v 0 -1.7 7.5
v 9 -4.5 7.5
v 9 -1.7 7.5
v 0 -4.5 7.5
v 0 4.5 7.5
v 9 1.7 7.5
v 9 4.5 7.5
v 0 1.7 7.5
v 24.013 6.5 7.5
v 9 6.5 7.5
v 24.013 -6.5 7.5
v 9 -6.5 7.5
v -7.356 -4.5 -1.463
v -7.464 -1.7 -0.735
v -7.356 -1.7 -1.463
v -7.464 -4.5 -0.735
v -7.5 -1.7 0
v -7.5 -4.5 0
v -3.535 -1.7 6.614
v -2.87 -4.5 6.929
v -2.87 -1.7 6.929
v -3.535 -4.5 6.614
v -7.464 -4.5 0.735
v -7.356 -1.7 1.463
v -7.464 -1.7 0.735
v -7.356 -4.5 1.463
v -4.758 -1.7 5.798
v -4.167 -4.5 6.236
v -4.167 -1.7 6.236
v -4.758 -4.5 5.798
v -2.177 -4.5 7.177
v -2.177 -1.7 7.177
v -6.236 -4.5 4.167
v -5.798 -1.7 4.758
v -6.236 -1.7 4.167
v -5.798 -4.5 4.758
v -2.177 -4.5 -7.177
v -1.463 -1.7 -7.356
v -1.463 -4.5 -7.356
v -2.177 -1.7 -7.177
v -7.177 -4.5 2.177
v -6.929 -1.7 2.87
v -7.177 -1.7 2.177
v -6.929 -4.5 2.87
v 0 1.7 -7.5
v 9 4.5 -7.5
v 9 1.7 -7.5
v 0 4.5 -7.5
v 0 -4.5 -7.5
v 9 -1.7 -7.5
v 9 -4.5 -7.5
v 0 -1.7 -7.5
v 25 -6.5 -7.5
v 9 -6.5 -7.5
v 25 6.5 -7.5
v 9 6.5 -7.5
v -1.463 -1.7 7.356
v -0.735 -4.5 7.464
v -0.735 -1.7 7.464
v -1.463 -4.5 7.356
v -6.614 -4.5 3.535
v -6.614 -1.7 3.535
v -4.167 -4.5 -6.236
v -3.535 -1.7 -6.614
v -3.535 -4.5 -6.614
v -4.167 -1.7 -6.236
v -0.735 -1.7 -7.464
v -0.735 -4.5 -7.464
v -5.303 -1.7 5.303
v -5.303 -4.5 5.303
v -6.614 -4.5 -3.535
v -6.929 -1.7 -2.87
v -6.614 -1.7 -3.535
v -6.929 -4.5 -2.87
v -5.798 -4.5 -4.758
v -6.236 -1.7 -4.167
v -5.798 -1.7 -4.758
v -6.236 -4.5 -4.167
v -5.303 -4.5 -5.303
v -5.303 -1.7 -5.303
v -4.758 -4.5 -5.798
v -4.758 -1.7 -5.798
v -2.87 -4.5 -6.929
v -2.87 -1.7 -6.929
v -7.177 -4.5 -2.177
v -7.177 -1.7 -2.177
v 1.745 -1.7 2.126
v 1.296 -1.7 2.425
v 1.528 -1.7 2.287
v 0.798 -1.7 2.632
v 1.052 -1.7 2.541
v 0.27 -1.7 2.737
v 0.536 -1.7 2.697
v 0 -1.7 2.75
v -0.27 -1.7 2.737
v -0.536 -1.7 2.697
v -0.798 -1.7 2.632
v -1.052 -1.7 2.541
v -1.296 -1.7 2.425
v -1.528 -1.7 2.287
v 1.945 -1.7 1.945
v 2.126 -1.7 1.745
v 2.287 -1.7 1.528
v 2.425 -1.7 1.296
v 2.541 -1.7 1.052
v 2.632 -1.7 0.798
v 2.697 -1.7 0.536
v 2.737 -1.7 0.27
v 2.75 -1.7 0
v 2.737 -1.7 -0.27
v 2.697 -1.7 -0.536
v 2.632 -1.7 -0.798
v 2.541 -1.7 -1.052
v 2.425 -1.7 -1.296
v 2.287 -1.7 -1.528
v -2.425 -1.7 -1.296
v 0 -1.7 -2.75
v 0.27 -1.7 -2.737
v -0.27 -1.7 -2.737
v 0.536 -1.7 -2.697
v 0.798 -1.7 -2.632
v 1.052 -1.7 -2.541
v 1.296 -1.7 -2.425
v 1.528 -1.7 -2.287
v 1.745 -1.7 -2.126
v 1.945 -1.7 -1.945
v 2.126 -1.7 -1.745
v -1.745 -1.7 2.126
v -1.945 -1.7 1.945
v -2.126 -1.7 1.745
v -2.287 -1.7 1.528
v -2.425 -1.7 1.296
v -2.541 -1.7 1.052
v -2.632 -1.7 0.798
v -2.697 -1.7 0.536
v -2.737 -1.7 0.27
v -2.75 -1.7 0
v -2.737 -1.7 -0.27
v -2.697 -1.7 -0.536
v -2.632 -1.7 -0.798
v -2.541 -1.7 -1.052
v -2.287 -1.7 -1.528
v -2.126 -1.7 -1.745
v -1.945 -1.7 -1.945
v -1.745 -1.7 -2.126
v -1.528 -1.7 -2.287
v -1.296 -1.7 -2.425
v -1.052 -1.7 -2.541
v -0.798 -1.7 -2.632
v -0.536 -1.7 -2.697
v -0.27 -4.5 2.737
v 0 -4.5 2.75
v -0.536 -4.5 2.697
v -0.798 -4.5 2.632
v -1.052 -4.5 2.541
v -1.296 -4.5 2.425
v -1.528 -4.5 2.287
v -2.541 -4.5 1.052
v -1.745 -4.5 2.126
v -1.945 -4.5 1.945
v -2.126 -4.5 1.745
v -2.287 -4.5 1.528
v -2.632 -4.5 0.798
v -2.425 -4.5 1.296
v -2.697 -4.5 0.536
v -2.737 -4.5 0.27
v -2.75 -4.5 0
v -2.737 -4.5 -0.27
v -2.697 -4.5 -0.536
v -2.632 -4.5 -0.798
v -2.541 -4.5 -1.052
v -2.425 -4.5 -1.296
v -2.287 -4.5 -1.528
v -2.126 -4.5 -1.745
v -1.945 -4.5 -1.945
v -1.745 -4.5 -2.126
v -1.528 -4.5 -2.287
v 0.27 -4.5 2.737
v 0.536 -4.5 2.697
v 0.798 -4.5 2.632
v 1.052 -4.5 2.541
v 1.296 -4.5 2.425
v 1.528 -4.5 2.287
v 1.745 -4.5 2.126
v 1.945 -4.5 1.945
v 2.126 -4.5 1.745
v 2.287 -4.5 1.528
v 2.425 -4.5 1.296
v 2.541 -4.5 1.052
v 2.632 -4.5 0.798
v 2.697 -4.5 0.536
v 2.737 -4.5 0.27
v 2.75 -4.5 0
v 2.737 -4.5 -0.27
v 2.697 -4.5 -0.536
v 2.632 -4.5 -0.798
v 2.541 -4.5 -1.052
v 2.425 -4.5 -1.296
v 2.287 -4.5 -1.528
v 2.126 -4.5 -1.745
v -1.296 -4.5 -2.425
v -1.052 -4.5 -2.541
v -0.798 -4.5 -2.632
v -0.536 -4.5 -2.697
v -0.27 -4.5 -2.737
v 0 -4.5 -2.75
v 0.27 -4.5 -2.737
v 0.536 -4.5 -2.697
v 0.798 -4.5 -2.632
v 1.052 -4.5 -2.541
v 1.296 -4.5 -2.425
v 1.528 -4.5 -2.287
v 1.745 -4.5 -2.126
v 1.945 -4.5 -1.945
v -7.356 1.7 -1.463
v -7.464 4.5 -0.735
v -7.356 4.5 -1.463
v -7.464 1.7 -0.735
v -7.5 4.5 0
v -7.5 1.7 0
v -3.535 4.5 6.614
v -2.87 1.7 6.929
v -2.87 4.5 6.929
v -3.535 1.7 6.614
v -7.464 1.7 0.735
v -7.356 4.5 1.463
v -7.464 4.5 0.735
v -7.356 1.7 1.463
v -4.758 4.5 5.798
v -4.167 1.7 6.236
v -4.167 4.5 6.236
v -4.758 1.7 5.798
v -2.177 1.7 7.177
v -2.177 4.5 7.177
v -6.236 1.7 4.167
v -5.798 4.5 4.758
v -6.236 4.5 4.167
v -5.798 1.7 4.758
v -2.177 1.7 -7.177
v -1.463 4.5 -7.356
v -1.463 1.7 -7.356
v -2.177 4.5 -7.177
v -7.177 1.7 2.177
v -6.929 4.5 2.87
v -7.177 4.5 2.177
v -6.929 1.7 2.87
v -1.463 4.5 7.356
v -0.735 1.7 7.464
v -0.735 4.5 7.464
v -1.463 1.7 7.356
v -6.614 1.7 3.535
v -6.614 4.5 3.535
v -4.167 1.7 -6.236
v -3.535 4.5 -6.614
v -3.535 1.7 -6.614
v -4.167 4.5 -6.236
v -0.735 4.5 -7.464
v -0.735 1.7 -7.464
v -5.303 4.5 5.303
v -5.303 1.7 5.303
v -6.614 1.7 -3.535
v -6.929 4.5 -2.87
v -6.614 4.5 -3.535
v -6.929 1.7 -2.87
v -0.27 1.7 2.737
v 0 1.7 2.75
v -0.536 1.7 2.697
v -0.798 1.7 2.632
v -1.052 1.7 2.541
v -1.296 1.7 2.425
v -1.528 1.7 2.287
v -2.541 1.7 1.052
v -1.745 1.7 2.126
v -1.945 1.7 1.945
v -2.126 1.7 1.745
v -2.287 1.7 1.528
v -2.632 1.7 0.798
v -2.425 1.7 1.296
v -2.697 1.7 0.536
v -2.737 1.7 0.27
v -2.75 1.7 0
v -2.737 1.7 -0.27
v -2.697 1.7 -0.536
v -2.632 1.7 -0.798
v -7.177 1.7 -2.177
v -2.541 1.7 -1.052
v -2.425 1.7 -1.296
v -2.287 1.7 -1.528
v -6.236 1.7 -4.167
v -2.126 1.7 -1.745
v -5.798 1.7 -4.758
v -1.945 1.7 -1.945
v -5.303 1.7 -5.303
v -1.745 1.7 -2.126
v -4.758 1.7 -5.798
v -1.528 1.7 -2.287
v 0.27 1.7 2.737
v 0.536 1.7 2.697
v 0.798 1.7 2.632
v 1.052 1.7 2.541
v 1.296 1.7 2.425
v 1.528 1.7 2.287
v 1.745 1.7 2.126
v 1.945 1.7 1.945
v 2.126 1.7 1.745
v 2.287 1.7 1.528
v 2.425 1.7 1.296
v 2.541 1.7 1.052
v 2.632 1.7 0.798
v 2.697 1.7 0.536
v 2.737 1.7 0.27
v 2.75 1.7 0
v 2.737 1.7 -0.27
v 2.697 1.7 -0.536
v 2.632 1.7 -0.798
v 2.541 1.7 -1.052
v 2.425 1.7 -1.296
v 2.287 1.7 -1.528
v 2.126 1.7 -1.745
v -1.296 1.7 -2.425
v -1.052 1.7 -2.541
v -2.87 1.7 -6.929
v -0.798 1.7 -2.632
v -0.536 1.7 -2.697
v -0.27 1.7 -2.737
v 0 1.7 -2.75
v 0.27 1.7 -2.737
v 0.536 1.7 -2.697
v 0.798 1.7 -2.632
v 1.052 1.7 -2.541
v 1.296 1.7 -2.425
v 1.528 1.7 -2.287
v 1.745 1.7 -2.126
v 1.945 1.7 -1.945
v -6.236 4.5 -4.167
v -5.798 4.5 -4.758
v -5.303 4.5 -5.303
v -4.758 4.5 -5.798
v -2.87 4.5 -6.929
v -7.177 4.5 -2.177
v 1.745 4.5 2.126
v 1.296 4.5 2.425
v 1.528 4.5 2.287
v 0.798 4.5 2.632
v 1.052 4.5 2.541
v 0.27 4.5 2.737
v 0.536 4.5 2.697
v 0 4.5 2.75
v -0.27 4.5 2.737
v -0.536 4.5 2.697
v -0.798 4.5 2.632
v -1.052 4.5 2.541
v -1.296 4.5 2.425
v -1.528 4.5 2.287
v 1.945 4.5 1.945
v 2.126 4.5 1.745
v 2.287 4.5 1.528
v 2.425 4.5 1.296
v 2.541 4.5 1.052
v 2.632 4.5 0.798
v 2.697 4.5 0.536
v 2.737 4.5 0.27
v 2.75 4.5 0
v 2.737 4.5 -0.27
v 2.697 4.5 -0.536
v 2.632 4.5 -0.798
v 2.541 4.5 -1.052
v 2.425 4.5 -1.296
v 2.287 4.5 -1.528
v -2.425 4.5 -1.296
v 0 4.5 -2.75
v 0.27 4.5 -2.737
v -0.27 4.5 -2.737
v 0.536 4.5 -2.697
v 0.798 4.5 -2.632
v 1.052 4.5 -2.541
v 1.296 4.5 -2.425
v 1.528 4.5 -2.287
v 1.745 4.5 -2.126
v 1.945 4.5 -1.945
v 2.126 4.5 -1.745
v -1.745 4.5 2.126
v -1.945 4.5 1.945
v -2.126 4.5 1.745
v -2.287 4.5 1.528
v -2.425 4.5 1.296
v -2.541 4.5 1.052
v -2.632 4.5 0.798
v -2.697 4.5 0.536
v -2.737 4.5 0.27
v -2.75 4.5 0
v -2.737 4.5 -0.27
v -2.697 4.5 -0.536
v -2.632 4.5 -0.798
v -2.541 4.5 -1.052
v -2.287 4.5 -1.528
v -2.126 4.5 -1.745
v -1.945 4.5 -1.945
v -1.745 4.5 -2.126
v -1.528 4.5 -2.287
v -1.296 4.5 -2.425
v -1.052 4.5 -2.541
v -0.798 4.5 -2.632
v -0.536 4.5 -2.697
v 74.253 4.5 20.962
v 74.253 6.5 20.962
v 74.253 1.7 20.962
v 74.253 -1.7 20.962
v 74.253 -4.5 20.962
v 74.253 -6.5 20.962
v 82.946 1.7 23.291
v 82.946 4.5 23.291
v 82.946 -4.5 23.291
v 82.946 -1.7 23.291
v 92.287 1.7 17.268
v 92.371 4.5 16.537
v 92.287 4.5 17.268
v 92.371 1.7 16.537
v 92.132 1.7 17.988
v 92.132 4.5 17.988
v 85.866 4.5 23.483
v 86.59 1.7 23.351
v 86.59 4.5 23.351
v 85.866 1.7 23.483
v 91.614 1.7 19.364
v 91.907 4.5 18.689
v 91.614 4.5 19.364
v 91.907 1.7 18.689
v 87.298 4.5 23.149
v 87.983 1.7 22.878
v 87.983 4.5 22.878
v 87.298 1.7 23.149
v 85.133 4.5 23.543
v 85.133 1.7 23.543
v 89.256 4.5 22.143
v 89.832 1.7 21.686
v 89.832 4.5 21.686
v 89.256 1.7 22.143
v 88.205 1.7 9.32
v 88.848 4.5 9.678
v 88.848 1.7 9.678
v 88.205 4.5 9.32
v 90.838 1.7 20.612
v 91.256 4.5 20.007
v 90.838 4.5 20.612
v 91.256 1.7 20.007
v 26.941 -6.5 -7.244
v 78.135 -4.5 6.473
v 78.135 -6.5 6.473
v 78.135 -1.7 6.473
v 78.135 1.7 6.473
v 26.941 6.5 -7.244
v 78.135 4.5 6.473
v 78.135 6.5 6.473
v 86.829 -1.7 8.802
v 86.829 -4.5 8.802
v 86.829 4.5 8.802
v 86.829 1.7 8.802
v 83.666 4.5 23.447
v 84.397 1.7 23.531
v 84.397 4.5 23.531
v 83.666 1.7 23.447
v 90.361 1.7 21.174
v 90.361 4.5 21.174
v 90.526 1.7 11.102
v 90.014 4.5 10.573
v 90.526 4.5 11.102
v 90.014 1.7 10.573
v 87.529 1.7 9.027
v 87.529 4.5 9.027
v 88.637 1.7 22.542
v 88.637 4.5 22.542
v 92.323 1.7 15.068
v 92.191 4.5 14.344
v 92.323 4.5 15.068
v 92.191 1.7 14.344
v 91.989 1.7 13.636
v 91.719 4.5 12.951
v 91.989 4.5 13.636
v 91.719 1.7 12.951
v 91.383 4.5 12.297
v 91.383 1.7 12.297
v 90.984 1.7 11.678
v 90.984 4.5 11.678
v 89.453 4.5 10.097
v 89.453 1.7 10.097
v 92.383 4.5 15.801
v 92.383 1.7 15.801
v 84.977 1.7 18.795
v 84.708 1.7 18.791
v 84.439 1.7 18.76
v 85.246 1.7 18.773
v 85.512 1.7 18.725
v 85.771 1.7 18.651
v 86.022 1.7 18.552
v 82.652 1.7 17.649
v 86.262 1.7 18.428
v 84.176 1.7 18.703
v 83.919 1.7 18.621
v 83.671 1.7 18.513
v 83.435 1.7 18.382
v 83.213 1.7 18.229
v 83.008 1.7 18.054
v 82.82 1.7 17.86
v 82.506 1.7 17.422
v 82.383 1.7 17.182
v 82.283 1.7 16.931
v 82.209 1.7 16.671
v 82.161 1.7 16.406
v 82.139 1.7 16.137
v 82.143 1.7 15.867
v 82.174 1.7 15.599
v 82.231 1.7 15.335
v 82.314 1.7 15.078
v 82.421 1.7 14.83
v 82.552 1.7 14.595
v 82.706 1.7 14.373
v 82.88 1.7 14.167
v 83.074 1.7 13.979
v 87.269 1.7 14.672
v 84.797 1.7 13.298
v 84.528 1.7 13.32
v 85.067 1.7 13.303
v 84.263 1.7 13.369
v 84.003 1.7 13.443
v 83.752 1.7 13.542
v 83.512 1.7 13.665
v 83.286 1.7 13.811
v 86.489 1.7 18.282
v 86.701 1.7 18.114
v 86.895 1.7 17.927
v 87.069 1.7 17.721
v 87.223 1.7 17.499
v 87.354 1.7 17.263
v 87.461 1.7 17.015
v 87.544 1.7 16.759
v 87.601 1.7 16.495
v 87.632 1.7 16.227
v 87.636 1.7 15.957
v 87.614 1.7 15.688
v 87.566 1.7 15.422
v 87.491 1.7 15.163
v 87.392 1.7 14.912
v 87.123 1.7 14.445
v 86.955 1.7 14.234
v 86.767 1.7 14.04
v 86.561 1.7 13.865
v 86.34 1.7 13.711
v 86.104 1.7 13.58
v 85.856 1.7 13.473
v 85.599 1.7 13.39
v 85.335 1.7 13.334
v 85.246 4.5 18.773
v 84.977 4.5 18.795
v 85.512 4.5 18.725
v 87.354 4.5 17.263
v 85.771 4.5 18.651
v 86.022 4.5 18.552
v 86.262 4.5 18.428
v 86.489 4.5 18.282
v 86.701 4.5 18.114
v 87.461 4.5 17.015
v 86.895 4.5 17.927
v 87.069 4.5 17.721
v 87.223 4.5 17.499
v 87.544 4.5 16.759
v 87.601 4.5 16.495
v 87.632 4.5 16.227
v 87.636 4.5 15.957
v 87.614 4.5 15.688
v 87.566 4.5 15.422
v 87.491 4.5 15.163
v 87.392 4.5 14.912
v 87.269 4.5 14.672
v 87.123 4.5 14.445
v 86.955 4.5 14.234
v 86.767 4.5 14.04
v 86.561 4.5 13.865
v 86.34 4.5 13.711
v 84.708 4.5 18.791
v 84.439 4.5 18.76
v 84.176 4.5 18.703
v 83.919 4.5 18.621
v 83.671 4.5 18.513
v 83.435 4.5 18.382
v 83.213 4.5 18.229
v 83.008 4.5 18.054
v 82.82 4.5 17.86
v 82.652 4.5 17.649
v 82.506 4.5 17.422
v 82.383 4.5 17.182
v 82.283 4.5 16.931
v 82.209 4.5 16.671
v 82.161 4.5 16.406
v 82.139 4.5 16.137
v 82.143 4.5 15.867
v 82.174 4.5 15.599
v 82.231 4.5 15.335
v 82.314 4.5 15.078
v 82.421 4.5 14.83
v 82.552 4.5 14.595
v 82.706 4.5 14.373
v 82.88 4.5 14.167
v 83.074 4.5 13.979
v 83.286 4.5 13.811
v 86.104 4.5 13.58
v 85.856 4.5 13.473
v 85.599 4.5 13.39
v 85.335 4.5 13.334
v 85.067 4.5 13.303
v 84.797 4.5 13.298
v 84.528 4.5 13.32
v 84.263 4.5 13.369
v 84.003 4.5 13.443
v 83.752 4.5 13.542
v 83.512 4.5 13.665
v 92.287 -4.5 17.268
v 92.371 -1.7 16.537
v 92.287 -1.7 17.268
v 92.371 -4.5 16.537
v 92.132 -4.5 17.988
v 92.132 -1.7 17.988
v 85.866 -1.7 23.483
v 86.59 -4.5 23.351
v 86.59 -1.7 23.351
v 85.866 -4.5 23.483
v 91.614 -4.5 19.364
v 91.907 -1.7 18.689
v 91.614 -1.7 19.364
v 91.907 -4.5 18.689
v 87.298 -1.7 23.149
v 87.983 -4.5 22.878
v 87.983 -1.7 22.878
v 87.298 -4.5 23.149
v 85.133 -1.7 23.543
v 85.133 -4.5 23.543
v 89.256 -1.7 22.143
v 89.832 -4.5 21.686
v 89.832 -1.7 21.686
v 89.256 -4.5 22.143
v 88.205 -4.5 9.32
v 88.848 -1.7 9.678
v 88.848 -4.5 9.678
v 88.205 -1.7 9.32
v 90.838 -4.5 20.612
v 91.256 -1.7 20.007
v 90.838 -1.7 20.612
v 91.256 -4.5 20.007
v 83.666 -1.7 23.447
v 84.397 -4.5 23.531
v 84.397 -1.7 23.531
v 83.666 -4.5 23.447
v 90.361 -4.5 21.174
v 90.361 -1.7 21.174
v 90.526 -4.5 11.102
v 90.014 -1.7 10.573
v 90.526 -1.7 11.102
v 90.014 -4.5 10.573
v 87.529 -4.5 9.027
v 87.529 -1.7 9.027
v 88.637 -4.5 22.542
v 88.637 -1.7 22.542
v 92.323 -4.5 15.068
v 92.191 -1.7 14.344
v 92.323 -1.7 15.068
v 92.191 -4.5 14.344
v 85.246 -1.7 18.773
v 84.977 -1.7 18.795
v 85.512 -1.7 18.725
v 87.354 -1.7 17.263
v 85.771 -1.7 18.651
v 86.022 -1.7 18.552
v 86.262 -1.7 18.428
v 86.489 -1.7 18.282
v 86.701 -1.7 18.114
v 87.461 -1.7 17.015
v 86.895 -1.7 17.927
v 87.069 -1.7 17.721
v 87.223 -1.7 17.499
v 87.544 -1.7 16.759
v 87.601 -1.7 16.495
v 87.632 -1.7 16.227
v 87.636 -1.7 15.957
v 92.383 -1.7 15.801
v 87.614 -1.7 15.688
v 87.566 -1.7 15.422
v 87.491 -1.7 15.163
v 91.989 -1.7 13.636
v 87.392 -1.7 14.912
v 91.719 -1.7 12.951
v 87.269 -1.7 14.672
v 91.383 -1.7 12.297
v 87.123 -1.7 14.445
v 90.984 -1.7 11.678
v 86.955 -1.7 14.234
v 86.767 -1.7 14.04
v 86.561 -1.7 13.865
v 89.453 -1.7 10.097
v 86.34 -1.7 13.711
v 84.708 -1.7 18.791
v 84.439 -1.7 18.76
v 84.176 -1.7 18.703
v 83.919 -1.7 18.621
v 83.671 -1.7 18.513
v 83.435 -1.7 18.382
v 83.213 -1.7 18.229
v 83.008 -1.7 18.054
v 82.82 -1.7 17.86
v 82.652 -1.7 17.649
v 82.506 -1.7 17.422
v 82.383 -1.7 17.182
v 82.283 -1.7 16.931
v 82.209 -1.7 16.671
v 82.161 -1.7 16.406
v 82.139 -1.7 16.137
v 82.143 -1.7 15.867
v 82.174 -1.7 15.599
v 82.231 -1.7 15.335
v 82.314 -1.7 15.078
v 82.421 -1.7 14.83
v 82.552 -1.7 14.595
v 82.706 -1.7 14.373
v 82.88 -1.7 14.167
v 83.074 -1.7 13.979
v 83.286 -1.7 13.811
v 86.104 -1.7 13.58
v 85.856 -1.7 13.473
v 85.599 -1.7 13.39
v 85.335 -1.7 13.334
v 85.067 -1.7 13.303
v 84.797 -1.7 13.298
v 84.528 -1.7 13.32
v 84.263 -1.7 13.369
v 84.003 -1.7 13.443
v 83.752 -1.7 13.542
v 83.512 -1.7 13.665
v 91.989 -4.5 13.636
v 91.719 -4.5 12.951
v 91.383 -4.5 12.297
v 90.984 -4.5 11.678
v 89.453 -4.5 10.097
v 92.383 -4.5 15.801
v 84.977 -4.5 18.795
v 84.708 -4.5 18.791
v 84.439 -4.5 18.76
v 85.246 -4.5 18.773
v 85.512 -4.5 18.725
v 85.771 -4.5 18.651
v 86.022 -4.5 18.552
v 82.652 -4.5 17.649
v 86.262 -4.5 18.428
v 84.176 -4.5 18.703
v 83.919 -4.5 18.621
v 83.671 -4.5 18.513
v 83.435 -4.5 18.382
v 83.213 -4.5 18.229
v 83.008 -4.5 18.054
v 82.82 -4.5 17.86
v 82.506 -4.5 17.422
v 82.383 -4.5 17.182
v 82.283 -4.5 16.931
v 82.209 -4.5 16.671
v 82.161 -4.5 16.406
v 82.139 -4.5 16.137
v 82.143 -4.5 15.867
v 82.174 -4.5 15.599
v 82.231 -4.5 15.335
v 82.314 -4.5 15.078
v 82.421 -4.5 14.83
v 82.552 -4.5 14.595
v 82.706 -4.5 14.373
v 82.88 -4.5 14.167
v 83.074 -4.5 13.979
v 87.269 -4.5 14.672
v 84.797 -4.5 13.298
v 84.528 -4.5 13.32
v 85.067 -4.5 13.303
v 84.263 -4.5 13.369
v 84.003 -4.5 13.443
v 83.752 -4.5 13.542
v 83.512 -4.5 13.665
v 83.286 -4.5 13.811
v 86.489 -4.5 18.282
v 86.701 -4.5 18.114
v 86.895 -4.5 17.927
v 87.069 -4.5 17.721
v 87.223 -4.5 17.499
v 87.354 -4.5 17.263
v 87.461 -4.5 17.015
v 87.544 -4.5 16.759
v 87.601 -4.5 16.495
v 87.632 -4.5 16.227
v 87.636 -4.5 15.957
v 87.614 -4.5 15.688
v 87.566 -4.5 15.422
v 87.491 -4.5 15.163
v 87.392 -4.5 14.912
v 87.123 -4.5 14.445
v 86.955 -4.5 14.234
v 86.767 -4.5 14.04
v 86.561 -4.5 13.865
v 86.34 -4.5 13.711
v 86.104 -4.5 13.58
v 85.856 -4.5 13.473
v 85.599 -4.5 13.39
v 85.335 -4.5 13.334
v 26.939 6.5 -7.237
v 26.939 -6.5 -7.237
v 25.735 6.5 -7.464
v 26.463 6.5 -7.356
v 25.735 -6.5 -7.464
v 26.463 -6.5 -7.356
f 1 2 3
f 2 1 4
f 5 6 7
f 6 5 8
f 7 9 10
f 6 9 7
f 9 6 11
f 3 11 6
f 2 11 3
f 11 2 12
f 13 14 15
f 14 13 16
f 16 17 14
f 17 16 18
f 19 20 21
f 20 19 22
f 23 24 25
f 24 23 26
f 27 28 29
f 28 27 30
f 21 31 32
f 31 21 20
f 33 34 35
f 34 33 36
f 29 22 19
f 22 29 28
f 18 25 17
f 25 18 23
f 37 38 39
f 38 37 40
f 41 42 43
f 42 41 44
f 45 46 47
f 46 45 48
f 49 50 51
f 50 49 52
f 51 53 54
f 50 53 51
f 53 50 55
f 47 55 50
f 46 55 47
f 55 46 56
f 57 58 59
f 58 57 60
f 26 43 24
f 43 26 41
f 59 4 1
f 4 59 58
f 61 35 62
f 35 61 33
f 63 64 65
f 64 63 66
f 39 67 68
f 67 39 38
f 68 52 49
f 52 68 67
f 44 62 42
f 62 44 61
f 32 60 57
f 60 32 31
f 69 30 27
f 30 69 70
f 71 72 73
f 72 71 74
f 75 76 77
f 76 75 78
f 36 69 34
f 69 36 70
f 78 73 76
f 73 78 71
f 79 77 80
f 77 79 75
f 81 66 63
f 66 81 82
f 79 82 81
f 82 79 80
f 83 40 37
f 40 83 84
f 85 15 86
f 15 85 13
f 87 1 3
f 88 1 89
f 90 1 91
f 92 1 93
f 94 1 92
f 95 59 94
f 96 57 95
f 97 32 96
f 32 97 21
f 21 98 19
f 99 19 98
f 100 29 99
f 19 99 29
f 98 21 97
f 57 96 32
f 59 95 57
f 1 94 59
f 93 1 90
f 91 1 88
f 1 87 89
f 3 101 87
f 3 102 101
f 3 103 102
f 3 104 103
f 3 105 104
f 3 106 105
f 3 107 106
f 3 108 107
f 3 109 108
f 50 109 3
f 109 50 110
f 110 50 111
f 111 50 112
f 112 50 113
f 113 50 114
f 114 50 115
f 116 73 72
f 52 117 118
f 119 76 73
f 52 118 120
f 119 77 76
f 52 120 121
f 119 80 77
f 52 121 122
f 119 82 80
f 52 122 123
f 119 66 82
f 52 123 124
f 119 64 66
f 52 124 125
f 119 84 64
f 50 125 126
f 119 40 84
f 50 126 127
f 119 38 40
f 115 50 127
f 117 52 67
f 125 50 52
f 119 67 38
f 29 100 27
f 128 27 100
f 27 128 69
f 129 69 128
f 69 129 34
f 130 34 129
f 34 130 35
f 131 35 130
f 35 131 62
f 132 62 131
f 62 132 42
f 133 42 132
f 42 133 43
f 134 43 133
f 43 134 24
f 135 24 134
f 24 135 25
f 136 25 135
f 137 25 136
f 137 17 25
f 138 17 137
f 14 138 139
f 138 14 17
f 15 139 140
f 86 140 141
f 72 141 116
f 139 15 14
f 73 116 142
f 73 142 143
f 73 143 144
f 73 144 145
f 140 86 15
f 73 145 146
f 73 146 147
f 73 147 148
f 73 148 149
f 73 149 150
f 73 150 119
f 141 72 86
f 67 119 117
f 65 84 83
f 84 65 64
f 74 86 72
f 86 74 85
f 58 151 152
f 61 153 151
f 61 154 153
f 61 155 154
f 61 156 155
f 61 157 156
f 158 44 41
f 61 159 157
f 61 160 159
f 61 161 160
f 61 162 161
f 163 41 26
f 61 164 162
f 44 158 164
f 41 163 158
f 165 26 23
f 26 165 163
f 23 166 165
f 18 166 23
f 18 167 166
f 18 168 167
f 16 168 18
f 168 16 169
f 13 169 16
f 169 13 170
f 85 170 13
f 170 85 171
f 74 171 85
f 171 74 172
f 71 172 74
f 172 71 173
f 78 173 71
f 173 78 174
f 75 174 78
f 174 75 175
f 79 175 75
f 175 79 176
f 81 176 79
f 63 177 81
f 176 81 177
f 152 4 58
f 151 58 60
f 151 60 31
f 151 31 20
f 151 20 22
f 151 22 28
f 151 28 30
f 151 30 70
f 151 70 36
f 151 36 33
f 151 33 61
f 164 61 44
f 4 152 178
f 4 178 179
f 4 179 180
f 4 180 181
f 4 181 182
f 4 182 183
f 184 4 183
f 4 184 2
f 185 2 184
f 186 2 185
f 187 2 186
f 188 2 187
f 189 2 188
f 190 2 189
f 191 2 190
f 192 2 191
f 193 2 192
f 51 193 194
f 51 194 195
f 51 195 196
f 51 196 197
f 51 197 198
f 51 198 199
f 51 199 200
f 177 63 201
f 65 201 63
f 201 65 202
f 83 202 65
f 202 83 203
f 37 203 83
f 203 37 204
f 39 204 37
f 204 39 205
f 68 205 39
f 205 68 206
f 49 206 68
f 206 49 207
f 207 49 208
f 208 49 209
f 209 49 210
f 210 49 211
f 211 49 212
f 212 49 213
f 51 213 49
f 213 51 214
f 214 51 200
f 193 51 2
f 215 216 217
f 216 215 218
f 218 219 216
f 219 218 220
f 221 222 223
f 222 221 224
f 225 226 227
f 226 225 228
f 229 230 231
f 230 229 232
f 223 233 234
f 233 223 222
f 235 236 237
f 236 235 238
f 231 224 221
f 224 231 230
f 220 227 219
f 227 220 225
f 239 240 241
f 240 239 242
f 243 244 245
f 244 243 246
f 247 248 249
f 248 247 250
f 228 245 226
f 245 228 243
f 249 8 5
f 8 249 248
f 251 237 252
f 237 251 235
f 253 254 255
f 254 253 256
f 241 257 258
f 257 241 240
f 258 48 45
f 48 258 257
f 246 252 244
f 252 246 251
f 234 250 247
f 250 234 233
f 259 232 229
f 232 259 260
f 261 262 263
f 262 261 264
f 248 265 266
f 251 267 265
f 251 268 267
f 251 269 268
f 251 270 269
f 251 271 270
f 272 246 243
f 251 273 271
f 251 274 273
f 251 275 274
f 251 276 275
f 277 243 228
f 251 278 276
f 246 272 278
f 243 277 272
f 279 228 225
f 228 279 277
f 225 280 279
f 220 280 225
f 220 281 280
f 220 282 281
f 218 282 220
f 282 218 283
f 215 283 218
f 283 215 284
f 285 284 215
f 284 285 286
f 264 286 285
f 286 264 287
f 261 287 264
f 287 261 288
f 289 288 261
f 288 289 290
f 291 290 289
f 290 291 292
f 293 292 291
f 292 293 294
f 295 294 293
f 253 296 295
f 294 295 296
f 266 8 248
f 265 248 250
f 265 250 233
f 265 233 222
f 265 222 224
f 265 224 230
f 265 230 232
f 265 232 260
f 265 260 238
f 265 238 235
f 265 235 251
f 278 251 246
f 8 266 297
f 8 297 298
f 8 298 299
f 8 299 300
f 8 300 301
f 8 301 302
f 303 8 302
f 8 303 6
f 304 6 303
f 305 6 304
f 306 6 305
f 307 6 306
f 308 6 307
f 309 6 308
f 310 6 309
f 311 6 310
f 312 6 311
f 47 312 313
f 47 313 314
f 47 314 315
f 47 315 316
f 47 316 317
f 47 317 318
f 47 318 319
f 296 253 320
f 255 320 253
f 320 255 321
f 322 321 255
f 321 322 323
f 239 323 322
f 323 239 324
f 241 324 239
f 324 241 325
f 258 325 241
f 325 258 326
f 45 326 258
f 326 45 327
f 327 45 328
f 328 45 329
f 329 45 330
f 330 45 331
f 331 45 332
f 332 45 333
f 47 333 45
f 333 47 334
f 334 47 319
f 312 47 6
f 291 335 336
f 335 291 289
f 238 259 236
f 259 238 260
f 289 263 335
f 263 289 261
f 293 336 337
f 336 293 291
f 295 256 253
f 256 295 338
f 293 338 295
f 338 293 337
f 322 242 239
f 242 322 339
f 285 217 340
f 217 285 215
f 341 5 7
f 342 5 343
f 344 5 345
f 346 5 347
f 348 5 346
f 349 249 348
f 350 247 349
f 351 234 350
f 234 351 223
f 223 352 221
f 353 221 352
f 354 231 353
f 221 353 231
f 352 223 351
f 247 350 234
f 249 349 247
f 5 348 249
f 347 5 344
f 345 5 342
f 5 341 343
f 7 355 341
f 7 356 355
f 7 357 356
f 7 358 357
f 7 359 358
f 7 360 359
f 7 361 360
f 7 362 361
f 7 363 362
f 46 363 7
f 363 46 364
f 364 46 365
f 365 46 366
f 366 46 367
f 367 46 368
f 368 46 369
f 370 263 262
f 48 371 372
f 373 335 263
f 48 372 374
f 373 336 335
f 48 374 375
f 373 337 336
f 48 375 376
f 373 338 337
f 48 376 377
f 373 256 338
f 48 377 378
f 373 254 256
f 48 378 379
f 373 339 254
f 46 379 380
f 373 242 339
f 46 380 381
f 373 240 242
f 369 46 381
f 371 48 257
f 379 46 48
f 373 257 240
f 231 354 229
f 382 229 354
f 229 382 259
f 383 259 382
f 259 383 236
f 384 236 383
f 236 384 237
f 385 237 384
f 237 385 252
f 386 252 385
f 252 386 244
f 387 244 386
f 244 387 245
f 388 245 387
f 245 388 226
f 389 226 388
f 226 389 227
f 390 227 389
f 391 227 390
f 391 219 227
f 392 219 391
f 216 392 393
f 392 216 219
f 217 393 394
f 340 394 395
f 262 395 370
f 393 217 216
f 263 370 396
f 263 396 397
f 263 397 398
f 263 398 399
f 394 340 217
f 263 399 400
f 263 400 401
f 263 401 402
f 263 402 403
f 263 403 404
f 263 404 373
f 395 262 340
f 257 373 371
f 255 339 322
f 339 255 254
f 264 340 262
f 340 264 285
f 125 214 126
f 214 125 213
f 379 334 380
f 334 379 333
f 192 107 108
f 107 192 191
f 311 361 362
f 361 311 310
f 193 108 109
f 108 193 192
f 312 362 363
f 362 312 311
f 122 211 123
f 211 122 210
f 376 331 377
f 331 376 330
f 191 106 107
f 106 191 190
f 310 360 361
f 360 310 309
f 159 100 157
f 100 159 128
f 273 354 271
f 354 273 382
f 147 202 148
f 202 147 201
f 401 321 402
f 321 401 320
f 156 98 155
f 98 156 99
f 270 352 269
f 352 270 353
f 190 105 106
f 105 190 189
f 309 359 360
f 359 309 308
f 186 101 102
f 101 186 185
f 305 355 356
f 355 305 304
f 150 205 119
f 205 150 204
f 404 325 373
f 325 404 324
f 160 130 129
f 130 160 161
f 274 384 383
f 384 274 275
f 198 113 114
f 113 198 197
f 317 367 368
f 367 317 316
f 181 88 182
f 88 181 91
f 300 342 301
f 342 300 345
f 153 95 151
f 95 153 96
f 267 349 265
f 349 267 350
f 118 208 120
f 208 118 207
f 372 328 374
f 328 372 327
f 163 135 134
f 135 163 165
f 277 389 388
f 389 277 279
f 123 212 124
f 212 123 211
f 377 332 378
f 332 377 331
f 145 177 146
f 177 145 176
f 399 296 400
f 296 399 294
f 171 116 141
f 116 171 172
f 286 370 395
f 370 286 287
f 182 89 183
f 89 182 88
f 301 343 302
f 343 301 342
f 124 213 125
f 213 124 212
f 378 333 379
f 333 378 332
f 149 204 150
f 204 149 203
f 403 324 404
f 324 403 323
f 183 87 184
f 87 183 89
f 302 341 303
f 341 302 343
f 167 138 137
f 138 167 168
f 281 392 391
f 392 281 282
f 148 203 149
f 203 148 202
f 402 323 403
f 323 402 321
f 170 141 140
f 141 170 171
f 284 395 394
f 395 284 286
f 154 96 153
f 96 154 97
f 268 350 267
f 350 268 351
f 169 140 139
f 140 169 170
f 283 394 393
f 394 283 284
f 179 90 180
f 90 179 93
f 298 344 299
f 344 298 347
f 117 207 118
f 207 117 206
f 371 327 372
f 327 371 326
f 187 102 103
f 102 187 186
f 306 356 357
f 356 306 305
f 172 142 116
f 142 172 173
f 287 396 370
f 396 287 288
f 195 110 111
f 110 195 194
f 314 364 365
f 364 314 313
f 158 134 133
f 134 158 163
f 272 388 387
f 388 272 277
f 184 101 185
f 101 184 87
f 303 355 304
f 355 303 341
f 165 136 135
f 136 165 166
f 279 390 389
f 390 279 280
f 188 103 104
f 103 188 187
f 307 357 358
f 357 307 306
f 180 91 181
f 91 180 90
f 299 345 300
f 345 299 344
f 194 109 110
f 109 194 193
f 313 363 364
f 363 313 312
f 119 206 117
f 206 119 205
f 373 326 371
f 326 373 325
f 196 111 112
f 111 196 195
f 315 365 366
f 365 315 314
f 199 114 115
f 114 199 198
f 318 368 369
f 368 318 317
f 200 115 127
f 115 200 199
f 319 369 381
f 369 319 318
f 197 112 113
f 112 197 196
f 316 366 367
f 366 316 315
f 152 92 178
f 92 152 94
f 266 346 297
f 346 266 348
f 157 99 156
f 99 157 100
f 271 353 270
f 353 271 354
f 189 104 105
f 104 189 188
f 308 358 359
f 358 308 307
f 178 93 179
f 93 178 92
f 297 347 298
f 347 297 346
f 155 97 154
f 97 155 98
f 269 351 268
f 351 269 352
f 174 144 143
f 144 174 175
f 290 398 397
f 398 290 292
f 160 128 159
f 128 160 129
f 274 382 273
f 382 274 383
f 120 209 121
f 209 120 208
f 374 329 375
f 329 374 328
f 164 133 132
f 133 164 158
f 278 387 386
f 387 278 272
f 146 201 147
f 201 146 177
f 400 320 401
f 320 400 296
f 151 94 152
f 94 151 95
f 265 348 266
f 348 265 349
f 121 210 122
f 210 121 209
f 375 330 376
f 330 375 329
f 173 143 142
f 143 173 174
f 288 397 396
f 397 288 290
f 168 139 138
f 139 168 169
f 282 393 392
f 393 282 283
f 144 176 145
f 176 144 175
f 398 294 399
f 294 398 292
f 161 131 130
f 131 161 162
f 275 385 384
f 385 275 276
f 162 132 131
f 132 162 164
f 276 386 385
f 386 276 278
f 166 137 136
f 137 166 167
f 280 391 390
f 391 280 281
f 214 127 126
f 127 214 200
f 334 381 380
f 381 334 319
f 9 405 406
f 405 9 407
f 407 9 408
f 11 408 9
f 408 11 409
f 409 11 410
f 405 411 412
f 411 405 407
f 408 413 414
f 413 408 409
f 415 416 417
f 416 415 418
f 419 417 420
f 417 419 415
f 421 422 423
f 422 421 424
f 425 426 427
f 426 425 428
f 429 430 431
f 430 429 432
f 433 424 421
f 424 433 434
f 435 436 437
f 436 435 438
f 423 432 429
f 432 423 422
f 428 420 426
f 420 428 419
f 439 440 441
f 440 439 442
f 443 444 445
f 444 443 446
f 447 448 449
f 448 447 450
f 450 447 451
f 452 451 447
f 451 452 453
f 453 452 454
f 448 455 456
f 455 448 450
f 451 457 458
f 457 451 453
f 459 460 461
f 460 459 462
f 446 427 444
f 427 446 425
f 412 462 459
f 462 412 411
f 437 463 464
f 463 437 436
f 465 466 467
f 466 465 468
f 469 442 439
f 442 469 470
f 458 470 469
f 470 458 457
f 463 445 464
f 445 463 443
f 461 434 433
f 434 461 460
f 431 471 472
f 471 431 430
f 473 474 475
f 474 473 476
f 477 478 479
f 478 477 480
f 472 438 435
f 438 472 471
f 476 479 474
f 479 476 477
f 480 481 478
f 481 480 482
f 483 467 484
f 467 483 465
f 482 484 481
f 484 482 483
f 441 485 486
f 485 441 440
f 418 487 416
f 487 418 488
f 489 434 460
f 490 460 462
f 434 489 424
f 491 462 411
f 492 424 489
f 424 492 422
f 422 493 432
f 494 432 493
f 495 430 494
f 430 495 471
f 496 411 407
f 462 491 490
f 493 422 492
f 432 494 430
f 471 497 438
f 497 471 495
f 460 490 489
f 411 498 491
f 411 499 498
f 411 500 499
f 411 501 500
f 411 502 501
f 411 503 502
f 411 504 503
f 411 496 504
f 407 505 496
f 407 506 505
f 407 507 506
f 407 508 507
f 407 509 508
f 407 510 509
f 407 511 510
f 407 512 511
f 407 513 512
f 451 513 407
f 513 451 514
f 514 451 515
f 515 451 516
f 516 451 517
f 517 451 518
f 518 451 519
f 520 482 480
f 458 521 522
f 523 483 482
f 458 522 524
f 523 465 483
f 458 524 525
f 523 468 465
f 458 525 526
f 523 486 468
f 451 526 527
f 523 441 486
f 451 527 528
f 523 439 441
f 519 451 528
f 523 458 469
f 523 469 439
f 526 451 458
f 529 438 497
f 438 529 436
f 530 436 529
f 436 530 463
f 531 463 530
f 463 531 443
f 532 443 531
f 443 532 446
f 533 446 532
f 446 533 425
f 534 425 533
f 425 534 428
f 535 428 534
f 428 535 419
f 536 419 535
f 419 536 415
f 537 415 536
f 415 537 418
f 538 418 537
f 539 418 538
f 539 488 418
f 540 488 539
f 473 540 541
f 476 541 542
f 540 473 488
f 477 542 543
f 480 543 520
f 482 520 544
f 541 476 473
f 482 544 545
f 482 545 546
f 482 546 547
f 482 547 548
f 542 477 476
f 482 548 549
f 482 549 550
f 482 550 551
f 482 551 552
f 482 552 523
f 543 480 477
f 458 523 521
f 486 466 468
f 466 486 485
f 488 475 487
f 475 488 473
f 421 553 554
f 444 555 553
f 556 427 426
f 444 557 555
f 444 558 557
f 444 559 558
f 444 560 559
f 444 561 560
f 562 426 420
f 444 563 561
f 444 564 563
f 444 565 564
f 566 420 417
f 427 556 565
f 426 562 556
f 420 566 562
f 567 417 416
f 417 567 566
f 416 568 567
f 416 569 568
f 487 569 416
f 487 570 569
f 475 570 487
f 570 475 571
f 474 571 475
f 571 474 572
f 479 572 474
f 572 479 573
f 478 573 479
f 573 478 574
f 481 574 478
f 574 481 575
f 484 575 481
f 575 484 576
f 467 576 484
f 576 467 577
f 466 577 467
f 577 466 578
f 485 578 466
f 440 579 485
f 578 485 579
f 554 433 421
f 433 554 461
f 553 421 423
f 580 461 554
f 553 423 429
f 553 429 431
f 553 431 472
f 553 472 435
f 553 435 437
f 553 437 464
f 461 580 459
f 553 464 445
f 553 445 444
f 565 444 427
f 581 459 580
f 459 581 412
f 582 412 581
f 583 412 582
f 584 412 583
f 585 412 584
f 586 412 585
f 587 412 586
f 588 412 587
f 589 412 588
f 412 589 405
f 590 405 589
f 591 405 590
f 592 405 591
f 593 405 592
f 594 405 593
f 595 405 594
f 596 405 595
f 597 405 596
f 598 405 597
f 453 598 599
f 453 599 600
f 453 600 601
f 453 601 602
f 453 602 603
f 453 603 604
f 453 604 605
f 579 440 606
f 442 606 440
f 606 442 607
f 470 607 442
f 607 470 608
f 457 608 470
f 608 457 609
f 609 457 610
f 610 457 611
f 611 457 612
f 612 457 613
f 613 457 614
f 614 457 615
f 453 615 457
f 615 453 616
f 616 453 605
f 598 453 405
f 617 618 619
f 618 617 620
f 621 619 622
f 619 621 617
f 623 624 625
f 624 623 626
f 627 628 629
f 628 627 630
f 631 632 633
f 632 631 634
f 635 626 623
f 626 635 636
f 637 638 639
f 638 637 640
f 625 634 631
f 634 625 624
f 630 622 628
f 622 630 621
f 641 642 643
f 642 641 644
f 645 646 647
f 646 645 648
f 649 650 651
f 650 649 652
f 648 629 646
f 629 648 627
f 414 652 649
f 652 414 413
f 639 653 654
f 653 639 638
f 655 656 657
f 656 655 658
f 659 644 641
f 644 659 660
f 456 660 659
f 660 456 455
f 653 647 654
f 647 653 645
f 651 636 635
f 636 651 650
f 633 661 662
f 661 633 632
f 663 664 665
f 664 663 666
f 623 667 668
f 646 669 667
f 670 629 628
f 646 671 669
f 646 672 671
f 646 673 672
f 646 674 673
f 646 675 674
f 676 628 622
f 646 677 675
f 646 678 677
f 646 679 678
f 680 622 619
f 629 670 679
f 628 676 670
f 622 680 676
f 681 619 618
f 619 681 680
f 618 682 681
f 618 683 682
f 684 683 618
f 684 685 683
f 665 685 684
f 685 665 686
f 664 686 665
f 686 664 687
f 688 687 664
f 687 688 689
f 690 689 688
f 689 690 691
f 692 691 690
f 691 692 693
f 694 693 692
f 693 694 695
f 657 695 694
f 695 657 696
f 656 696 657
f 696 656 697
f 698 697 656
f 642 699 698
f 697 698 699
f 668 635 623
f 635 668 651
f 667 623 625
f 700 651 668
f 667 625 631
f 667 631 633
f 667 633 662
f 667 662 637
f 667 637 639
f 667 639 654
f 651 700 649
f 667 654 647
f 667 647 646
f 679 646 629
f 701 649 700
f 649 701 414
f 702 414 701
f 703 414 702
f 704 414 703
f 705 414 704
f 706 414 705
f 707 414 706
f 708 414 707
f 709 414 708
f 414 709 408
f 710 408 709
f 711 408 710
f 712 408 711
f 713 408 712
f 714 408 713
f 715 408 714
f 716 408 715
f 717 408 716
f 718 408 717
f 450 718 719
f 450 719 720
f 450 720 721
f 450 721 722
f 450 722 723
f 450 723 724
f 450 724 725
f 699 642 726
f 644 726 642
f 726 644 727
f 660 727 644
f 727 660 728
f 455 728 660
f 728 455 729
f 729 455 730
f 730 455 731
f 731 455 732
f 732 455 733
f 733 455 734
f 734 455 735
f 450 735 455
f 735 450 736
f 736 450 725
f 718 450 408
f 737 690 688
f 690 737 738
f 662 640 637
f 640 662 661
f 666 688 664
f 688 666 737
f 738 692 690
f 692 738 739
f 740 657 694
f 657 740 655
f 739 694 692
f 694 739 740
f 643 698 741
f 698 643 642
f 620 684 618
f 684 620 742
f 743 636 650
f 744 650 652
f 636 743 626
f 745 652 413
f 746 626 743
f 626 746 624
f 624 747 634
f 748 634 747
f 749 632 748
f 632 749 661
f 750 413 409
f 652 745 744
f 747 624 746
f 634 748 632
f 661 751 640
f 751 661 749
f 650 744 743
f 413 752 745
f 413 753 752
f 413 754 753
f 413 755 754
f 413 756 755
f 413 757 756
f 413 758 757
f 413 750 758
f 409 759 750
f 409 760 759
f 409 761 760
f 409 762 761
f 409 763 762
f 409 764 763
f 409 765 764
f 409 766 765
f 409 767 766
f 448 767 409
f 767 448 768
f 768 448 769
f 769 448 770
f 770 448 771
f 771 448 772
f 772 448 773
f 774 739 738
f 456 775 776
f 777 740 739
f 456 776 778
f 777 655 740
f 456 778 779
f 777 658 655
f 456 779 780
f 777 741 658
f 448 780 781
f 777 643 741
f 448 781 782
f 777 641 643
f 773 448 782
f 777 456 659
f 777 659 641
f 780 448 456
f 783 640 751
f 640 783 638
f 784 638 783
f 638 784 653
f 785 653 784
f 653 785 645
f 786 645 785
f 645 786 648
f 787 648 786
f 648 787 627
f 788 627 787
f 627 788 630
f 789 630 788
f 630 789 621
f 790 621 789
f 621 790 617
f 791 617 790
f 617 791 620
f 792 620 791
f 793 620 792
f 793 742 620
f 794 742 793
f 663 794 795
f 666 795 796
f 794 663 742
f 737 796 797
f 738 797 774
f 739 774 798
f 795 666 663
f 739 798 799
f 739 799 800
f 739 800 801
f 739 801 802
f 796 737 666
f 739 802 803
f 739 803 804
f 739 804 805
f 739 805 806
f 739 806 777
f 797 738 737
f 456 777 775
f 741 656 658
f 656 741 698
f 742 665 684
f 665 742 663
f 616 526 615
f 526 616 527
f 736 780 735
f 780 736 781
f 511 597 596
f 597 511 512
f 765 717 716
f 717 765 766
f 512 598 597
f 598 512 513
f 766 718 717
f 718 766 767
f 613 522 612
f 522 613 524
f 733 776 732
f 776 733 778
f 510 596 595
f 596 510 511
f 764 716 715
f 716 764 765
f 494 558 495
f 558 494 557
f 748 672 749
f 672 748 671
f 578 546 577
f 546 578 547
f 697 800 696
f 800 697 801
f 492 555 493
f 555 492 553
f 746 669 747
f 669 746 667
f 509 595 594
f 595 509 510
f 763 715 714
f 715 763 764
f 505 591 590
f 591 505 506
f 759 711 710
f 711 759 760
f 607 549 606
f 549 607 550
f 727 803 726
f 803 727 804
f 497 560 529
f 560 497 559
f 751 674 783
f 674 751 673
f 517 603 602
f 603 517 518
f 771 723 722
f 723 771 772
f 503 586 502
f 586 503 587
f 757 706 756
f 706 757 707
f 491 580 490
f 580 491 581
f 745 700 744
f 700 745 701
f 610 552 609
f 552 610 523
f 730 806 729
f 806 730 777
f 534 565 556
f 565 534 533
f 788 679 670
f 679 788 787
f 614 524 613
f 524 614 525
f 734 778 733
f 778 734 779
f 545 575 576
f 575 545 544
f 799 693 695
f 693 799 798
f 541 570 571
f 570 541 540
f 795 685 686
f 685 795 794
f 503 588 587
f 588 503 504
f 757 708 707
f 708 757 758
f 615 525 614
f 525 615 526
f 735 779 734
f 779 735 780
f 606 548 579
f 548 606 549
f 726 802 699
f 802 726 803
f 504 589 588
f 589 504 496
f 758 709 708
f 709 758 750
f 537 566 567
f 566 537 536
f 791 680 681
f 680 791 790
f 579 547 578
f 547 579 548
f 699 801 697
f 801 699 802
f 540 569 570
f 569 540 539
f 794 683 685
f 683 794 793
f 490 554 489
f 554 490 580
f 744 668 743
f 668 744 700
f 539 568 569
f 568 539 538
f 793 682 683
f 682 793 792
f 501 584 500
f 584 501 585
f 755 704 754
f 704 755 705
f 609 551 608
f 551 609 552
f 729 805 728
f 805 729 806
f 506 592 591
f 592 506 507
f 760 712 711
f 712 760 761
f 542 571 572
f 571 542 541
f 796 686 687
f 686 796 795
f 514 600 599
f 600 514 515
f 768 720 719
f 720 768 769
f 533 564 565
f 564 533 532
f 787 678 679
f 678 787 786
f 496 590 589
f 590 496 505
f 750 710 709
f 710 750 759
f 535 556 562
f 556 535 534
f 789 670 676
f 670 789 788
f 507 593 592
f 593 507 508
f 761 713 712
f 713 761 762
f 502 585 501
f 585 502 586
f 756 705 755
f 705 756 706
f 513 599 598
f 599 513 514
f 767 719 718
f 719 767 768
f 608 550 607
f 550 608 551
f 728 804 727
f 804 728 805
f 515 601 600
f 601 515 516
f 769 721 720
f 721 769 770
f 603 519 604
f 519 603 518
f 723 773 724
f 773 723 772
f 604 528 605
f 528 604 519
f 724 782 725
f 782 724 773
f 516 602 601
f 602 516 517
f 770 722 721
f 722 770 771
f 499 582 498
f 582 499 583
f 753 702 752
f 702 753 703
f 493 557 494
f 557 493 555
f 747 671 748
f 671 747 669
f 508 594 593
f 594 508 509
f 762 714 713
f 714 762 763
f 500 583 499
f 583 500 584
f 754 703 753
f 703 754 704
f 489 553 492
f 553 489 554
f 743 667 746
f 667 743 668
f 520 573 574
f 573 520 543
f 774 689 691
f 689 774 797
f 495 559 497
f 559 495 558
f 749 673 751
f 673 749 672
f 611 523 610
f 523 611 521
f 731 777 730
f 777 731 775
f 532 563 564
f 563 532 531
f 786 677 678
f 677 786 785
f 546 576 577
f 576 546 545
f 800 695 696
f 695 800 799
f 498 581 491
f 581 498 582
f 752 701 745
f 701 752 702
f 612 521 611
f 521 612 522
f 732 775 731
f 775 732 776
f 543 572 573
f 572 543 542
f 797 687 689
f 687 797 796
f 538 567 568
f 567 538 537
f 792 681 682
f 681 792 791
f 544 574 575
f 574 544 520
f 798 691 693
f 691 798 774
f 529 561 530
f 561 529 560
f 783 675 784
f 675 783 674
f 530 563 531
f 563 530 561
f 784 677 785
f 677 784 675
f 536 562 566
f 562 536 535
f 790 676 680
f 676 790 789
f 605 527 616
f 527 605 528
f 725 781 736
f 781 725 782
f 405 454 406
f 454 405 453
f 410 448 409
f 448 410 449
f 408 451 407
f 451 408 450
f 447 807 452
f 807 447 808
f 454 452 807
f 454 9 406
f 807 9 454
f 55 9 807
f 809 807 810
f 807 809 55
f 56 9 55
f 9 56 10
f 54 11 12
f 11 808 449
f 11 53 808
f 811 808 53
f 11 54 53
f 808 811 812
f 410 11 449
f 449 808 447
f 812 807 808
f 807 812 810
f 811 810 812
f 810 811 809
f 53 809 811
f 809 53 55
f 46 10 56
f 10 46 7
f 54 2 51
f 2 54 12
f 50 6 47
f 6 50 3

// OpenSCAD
// Bent GoPro 2-prong to 2-prong bar for the helmet HUD
// Measured from gopro_2-prong_to_2-prong_straight_adapter_bar_60mm_gap.stl
$fn = 64;

bend  = 15;   // degrees of bend (photo shows ~15 deg rise to cancel)
L1    = 25;   // visor-end hole to the bend
L2    = 62;   // bend to HUD-end hole (L1+L2 = 87, 1 cm longer than the 60 mm bar)
R     = 7.5;  // round end radius, half of the 15 mm height
W     = 13;   // body width
pw    = 2.8;  // prong thickness
gap   = 3.4;  // gap between the two prongs
hole  = 5.5;  // thumbscrew hole
neck  = 9;    // hole centre to where the solid body starts

module tab() {               // two prongs, hole at the origin, pointing -X
  difference() {
    for (s = [-1, 1])
      translate([0, s * (gap + pw) / 2, 0]) rotate([90, 0, 0])
        linear_extrude(pw, center = true)
          hull() { circle(R); translate([neck + 1, -R]) square([0.01, 2 * R]); }
    rotate([90, 0, 0]) cylinder(d = hole, h = 20, center = true);
  }
}
module body(a, b) { translate([a, -W / 2, -R]) cube([b - a, W, 2 * R]); }
module joint()    { rotate([90, 0, 0]) cylinder(r = R, h = W, center = true); }

tab();
body(neck, L1);
translate([L1, 0, 0]) {
  joint();
  rotate([0, -bend, 0]) {
    body(0, L2 - neck);
    translate([L2, 0, 0]) rotate([0, 0, 180]) tab();
  }
}
